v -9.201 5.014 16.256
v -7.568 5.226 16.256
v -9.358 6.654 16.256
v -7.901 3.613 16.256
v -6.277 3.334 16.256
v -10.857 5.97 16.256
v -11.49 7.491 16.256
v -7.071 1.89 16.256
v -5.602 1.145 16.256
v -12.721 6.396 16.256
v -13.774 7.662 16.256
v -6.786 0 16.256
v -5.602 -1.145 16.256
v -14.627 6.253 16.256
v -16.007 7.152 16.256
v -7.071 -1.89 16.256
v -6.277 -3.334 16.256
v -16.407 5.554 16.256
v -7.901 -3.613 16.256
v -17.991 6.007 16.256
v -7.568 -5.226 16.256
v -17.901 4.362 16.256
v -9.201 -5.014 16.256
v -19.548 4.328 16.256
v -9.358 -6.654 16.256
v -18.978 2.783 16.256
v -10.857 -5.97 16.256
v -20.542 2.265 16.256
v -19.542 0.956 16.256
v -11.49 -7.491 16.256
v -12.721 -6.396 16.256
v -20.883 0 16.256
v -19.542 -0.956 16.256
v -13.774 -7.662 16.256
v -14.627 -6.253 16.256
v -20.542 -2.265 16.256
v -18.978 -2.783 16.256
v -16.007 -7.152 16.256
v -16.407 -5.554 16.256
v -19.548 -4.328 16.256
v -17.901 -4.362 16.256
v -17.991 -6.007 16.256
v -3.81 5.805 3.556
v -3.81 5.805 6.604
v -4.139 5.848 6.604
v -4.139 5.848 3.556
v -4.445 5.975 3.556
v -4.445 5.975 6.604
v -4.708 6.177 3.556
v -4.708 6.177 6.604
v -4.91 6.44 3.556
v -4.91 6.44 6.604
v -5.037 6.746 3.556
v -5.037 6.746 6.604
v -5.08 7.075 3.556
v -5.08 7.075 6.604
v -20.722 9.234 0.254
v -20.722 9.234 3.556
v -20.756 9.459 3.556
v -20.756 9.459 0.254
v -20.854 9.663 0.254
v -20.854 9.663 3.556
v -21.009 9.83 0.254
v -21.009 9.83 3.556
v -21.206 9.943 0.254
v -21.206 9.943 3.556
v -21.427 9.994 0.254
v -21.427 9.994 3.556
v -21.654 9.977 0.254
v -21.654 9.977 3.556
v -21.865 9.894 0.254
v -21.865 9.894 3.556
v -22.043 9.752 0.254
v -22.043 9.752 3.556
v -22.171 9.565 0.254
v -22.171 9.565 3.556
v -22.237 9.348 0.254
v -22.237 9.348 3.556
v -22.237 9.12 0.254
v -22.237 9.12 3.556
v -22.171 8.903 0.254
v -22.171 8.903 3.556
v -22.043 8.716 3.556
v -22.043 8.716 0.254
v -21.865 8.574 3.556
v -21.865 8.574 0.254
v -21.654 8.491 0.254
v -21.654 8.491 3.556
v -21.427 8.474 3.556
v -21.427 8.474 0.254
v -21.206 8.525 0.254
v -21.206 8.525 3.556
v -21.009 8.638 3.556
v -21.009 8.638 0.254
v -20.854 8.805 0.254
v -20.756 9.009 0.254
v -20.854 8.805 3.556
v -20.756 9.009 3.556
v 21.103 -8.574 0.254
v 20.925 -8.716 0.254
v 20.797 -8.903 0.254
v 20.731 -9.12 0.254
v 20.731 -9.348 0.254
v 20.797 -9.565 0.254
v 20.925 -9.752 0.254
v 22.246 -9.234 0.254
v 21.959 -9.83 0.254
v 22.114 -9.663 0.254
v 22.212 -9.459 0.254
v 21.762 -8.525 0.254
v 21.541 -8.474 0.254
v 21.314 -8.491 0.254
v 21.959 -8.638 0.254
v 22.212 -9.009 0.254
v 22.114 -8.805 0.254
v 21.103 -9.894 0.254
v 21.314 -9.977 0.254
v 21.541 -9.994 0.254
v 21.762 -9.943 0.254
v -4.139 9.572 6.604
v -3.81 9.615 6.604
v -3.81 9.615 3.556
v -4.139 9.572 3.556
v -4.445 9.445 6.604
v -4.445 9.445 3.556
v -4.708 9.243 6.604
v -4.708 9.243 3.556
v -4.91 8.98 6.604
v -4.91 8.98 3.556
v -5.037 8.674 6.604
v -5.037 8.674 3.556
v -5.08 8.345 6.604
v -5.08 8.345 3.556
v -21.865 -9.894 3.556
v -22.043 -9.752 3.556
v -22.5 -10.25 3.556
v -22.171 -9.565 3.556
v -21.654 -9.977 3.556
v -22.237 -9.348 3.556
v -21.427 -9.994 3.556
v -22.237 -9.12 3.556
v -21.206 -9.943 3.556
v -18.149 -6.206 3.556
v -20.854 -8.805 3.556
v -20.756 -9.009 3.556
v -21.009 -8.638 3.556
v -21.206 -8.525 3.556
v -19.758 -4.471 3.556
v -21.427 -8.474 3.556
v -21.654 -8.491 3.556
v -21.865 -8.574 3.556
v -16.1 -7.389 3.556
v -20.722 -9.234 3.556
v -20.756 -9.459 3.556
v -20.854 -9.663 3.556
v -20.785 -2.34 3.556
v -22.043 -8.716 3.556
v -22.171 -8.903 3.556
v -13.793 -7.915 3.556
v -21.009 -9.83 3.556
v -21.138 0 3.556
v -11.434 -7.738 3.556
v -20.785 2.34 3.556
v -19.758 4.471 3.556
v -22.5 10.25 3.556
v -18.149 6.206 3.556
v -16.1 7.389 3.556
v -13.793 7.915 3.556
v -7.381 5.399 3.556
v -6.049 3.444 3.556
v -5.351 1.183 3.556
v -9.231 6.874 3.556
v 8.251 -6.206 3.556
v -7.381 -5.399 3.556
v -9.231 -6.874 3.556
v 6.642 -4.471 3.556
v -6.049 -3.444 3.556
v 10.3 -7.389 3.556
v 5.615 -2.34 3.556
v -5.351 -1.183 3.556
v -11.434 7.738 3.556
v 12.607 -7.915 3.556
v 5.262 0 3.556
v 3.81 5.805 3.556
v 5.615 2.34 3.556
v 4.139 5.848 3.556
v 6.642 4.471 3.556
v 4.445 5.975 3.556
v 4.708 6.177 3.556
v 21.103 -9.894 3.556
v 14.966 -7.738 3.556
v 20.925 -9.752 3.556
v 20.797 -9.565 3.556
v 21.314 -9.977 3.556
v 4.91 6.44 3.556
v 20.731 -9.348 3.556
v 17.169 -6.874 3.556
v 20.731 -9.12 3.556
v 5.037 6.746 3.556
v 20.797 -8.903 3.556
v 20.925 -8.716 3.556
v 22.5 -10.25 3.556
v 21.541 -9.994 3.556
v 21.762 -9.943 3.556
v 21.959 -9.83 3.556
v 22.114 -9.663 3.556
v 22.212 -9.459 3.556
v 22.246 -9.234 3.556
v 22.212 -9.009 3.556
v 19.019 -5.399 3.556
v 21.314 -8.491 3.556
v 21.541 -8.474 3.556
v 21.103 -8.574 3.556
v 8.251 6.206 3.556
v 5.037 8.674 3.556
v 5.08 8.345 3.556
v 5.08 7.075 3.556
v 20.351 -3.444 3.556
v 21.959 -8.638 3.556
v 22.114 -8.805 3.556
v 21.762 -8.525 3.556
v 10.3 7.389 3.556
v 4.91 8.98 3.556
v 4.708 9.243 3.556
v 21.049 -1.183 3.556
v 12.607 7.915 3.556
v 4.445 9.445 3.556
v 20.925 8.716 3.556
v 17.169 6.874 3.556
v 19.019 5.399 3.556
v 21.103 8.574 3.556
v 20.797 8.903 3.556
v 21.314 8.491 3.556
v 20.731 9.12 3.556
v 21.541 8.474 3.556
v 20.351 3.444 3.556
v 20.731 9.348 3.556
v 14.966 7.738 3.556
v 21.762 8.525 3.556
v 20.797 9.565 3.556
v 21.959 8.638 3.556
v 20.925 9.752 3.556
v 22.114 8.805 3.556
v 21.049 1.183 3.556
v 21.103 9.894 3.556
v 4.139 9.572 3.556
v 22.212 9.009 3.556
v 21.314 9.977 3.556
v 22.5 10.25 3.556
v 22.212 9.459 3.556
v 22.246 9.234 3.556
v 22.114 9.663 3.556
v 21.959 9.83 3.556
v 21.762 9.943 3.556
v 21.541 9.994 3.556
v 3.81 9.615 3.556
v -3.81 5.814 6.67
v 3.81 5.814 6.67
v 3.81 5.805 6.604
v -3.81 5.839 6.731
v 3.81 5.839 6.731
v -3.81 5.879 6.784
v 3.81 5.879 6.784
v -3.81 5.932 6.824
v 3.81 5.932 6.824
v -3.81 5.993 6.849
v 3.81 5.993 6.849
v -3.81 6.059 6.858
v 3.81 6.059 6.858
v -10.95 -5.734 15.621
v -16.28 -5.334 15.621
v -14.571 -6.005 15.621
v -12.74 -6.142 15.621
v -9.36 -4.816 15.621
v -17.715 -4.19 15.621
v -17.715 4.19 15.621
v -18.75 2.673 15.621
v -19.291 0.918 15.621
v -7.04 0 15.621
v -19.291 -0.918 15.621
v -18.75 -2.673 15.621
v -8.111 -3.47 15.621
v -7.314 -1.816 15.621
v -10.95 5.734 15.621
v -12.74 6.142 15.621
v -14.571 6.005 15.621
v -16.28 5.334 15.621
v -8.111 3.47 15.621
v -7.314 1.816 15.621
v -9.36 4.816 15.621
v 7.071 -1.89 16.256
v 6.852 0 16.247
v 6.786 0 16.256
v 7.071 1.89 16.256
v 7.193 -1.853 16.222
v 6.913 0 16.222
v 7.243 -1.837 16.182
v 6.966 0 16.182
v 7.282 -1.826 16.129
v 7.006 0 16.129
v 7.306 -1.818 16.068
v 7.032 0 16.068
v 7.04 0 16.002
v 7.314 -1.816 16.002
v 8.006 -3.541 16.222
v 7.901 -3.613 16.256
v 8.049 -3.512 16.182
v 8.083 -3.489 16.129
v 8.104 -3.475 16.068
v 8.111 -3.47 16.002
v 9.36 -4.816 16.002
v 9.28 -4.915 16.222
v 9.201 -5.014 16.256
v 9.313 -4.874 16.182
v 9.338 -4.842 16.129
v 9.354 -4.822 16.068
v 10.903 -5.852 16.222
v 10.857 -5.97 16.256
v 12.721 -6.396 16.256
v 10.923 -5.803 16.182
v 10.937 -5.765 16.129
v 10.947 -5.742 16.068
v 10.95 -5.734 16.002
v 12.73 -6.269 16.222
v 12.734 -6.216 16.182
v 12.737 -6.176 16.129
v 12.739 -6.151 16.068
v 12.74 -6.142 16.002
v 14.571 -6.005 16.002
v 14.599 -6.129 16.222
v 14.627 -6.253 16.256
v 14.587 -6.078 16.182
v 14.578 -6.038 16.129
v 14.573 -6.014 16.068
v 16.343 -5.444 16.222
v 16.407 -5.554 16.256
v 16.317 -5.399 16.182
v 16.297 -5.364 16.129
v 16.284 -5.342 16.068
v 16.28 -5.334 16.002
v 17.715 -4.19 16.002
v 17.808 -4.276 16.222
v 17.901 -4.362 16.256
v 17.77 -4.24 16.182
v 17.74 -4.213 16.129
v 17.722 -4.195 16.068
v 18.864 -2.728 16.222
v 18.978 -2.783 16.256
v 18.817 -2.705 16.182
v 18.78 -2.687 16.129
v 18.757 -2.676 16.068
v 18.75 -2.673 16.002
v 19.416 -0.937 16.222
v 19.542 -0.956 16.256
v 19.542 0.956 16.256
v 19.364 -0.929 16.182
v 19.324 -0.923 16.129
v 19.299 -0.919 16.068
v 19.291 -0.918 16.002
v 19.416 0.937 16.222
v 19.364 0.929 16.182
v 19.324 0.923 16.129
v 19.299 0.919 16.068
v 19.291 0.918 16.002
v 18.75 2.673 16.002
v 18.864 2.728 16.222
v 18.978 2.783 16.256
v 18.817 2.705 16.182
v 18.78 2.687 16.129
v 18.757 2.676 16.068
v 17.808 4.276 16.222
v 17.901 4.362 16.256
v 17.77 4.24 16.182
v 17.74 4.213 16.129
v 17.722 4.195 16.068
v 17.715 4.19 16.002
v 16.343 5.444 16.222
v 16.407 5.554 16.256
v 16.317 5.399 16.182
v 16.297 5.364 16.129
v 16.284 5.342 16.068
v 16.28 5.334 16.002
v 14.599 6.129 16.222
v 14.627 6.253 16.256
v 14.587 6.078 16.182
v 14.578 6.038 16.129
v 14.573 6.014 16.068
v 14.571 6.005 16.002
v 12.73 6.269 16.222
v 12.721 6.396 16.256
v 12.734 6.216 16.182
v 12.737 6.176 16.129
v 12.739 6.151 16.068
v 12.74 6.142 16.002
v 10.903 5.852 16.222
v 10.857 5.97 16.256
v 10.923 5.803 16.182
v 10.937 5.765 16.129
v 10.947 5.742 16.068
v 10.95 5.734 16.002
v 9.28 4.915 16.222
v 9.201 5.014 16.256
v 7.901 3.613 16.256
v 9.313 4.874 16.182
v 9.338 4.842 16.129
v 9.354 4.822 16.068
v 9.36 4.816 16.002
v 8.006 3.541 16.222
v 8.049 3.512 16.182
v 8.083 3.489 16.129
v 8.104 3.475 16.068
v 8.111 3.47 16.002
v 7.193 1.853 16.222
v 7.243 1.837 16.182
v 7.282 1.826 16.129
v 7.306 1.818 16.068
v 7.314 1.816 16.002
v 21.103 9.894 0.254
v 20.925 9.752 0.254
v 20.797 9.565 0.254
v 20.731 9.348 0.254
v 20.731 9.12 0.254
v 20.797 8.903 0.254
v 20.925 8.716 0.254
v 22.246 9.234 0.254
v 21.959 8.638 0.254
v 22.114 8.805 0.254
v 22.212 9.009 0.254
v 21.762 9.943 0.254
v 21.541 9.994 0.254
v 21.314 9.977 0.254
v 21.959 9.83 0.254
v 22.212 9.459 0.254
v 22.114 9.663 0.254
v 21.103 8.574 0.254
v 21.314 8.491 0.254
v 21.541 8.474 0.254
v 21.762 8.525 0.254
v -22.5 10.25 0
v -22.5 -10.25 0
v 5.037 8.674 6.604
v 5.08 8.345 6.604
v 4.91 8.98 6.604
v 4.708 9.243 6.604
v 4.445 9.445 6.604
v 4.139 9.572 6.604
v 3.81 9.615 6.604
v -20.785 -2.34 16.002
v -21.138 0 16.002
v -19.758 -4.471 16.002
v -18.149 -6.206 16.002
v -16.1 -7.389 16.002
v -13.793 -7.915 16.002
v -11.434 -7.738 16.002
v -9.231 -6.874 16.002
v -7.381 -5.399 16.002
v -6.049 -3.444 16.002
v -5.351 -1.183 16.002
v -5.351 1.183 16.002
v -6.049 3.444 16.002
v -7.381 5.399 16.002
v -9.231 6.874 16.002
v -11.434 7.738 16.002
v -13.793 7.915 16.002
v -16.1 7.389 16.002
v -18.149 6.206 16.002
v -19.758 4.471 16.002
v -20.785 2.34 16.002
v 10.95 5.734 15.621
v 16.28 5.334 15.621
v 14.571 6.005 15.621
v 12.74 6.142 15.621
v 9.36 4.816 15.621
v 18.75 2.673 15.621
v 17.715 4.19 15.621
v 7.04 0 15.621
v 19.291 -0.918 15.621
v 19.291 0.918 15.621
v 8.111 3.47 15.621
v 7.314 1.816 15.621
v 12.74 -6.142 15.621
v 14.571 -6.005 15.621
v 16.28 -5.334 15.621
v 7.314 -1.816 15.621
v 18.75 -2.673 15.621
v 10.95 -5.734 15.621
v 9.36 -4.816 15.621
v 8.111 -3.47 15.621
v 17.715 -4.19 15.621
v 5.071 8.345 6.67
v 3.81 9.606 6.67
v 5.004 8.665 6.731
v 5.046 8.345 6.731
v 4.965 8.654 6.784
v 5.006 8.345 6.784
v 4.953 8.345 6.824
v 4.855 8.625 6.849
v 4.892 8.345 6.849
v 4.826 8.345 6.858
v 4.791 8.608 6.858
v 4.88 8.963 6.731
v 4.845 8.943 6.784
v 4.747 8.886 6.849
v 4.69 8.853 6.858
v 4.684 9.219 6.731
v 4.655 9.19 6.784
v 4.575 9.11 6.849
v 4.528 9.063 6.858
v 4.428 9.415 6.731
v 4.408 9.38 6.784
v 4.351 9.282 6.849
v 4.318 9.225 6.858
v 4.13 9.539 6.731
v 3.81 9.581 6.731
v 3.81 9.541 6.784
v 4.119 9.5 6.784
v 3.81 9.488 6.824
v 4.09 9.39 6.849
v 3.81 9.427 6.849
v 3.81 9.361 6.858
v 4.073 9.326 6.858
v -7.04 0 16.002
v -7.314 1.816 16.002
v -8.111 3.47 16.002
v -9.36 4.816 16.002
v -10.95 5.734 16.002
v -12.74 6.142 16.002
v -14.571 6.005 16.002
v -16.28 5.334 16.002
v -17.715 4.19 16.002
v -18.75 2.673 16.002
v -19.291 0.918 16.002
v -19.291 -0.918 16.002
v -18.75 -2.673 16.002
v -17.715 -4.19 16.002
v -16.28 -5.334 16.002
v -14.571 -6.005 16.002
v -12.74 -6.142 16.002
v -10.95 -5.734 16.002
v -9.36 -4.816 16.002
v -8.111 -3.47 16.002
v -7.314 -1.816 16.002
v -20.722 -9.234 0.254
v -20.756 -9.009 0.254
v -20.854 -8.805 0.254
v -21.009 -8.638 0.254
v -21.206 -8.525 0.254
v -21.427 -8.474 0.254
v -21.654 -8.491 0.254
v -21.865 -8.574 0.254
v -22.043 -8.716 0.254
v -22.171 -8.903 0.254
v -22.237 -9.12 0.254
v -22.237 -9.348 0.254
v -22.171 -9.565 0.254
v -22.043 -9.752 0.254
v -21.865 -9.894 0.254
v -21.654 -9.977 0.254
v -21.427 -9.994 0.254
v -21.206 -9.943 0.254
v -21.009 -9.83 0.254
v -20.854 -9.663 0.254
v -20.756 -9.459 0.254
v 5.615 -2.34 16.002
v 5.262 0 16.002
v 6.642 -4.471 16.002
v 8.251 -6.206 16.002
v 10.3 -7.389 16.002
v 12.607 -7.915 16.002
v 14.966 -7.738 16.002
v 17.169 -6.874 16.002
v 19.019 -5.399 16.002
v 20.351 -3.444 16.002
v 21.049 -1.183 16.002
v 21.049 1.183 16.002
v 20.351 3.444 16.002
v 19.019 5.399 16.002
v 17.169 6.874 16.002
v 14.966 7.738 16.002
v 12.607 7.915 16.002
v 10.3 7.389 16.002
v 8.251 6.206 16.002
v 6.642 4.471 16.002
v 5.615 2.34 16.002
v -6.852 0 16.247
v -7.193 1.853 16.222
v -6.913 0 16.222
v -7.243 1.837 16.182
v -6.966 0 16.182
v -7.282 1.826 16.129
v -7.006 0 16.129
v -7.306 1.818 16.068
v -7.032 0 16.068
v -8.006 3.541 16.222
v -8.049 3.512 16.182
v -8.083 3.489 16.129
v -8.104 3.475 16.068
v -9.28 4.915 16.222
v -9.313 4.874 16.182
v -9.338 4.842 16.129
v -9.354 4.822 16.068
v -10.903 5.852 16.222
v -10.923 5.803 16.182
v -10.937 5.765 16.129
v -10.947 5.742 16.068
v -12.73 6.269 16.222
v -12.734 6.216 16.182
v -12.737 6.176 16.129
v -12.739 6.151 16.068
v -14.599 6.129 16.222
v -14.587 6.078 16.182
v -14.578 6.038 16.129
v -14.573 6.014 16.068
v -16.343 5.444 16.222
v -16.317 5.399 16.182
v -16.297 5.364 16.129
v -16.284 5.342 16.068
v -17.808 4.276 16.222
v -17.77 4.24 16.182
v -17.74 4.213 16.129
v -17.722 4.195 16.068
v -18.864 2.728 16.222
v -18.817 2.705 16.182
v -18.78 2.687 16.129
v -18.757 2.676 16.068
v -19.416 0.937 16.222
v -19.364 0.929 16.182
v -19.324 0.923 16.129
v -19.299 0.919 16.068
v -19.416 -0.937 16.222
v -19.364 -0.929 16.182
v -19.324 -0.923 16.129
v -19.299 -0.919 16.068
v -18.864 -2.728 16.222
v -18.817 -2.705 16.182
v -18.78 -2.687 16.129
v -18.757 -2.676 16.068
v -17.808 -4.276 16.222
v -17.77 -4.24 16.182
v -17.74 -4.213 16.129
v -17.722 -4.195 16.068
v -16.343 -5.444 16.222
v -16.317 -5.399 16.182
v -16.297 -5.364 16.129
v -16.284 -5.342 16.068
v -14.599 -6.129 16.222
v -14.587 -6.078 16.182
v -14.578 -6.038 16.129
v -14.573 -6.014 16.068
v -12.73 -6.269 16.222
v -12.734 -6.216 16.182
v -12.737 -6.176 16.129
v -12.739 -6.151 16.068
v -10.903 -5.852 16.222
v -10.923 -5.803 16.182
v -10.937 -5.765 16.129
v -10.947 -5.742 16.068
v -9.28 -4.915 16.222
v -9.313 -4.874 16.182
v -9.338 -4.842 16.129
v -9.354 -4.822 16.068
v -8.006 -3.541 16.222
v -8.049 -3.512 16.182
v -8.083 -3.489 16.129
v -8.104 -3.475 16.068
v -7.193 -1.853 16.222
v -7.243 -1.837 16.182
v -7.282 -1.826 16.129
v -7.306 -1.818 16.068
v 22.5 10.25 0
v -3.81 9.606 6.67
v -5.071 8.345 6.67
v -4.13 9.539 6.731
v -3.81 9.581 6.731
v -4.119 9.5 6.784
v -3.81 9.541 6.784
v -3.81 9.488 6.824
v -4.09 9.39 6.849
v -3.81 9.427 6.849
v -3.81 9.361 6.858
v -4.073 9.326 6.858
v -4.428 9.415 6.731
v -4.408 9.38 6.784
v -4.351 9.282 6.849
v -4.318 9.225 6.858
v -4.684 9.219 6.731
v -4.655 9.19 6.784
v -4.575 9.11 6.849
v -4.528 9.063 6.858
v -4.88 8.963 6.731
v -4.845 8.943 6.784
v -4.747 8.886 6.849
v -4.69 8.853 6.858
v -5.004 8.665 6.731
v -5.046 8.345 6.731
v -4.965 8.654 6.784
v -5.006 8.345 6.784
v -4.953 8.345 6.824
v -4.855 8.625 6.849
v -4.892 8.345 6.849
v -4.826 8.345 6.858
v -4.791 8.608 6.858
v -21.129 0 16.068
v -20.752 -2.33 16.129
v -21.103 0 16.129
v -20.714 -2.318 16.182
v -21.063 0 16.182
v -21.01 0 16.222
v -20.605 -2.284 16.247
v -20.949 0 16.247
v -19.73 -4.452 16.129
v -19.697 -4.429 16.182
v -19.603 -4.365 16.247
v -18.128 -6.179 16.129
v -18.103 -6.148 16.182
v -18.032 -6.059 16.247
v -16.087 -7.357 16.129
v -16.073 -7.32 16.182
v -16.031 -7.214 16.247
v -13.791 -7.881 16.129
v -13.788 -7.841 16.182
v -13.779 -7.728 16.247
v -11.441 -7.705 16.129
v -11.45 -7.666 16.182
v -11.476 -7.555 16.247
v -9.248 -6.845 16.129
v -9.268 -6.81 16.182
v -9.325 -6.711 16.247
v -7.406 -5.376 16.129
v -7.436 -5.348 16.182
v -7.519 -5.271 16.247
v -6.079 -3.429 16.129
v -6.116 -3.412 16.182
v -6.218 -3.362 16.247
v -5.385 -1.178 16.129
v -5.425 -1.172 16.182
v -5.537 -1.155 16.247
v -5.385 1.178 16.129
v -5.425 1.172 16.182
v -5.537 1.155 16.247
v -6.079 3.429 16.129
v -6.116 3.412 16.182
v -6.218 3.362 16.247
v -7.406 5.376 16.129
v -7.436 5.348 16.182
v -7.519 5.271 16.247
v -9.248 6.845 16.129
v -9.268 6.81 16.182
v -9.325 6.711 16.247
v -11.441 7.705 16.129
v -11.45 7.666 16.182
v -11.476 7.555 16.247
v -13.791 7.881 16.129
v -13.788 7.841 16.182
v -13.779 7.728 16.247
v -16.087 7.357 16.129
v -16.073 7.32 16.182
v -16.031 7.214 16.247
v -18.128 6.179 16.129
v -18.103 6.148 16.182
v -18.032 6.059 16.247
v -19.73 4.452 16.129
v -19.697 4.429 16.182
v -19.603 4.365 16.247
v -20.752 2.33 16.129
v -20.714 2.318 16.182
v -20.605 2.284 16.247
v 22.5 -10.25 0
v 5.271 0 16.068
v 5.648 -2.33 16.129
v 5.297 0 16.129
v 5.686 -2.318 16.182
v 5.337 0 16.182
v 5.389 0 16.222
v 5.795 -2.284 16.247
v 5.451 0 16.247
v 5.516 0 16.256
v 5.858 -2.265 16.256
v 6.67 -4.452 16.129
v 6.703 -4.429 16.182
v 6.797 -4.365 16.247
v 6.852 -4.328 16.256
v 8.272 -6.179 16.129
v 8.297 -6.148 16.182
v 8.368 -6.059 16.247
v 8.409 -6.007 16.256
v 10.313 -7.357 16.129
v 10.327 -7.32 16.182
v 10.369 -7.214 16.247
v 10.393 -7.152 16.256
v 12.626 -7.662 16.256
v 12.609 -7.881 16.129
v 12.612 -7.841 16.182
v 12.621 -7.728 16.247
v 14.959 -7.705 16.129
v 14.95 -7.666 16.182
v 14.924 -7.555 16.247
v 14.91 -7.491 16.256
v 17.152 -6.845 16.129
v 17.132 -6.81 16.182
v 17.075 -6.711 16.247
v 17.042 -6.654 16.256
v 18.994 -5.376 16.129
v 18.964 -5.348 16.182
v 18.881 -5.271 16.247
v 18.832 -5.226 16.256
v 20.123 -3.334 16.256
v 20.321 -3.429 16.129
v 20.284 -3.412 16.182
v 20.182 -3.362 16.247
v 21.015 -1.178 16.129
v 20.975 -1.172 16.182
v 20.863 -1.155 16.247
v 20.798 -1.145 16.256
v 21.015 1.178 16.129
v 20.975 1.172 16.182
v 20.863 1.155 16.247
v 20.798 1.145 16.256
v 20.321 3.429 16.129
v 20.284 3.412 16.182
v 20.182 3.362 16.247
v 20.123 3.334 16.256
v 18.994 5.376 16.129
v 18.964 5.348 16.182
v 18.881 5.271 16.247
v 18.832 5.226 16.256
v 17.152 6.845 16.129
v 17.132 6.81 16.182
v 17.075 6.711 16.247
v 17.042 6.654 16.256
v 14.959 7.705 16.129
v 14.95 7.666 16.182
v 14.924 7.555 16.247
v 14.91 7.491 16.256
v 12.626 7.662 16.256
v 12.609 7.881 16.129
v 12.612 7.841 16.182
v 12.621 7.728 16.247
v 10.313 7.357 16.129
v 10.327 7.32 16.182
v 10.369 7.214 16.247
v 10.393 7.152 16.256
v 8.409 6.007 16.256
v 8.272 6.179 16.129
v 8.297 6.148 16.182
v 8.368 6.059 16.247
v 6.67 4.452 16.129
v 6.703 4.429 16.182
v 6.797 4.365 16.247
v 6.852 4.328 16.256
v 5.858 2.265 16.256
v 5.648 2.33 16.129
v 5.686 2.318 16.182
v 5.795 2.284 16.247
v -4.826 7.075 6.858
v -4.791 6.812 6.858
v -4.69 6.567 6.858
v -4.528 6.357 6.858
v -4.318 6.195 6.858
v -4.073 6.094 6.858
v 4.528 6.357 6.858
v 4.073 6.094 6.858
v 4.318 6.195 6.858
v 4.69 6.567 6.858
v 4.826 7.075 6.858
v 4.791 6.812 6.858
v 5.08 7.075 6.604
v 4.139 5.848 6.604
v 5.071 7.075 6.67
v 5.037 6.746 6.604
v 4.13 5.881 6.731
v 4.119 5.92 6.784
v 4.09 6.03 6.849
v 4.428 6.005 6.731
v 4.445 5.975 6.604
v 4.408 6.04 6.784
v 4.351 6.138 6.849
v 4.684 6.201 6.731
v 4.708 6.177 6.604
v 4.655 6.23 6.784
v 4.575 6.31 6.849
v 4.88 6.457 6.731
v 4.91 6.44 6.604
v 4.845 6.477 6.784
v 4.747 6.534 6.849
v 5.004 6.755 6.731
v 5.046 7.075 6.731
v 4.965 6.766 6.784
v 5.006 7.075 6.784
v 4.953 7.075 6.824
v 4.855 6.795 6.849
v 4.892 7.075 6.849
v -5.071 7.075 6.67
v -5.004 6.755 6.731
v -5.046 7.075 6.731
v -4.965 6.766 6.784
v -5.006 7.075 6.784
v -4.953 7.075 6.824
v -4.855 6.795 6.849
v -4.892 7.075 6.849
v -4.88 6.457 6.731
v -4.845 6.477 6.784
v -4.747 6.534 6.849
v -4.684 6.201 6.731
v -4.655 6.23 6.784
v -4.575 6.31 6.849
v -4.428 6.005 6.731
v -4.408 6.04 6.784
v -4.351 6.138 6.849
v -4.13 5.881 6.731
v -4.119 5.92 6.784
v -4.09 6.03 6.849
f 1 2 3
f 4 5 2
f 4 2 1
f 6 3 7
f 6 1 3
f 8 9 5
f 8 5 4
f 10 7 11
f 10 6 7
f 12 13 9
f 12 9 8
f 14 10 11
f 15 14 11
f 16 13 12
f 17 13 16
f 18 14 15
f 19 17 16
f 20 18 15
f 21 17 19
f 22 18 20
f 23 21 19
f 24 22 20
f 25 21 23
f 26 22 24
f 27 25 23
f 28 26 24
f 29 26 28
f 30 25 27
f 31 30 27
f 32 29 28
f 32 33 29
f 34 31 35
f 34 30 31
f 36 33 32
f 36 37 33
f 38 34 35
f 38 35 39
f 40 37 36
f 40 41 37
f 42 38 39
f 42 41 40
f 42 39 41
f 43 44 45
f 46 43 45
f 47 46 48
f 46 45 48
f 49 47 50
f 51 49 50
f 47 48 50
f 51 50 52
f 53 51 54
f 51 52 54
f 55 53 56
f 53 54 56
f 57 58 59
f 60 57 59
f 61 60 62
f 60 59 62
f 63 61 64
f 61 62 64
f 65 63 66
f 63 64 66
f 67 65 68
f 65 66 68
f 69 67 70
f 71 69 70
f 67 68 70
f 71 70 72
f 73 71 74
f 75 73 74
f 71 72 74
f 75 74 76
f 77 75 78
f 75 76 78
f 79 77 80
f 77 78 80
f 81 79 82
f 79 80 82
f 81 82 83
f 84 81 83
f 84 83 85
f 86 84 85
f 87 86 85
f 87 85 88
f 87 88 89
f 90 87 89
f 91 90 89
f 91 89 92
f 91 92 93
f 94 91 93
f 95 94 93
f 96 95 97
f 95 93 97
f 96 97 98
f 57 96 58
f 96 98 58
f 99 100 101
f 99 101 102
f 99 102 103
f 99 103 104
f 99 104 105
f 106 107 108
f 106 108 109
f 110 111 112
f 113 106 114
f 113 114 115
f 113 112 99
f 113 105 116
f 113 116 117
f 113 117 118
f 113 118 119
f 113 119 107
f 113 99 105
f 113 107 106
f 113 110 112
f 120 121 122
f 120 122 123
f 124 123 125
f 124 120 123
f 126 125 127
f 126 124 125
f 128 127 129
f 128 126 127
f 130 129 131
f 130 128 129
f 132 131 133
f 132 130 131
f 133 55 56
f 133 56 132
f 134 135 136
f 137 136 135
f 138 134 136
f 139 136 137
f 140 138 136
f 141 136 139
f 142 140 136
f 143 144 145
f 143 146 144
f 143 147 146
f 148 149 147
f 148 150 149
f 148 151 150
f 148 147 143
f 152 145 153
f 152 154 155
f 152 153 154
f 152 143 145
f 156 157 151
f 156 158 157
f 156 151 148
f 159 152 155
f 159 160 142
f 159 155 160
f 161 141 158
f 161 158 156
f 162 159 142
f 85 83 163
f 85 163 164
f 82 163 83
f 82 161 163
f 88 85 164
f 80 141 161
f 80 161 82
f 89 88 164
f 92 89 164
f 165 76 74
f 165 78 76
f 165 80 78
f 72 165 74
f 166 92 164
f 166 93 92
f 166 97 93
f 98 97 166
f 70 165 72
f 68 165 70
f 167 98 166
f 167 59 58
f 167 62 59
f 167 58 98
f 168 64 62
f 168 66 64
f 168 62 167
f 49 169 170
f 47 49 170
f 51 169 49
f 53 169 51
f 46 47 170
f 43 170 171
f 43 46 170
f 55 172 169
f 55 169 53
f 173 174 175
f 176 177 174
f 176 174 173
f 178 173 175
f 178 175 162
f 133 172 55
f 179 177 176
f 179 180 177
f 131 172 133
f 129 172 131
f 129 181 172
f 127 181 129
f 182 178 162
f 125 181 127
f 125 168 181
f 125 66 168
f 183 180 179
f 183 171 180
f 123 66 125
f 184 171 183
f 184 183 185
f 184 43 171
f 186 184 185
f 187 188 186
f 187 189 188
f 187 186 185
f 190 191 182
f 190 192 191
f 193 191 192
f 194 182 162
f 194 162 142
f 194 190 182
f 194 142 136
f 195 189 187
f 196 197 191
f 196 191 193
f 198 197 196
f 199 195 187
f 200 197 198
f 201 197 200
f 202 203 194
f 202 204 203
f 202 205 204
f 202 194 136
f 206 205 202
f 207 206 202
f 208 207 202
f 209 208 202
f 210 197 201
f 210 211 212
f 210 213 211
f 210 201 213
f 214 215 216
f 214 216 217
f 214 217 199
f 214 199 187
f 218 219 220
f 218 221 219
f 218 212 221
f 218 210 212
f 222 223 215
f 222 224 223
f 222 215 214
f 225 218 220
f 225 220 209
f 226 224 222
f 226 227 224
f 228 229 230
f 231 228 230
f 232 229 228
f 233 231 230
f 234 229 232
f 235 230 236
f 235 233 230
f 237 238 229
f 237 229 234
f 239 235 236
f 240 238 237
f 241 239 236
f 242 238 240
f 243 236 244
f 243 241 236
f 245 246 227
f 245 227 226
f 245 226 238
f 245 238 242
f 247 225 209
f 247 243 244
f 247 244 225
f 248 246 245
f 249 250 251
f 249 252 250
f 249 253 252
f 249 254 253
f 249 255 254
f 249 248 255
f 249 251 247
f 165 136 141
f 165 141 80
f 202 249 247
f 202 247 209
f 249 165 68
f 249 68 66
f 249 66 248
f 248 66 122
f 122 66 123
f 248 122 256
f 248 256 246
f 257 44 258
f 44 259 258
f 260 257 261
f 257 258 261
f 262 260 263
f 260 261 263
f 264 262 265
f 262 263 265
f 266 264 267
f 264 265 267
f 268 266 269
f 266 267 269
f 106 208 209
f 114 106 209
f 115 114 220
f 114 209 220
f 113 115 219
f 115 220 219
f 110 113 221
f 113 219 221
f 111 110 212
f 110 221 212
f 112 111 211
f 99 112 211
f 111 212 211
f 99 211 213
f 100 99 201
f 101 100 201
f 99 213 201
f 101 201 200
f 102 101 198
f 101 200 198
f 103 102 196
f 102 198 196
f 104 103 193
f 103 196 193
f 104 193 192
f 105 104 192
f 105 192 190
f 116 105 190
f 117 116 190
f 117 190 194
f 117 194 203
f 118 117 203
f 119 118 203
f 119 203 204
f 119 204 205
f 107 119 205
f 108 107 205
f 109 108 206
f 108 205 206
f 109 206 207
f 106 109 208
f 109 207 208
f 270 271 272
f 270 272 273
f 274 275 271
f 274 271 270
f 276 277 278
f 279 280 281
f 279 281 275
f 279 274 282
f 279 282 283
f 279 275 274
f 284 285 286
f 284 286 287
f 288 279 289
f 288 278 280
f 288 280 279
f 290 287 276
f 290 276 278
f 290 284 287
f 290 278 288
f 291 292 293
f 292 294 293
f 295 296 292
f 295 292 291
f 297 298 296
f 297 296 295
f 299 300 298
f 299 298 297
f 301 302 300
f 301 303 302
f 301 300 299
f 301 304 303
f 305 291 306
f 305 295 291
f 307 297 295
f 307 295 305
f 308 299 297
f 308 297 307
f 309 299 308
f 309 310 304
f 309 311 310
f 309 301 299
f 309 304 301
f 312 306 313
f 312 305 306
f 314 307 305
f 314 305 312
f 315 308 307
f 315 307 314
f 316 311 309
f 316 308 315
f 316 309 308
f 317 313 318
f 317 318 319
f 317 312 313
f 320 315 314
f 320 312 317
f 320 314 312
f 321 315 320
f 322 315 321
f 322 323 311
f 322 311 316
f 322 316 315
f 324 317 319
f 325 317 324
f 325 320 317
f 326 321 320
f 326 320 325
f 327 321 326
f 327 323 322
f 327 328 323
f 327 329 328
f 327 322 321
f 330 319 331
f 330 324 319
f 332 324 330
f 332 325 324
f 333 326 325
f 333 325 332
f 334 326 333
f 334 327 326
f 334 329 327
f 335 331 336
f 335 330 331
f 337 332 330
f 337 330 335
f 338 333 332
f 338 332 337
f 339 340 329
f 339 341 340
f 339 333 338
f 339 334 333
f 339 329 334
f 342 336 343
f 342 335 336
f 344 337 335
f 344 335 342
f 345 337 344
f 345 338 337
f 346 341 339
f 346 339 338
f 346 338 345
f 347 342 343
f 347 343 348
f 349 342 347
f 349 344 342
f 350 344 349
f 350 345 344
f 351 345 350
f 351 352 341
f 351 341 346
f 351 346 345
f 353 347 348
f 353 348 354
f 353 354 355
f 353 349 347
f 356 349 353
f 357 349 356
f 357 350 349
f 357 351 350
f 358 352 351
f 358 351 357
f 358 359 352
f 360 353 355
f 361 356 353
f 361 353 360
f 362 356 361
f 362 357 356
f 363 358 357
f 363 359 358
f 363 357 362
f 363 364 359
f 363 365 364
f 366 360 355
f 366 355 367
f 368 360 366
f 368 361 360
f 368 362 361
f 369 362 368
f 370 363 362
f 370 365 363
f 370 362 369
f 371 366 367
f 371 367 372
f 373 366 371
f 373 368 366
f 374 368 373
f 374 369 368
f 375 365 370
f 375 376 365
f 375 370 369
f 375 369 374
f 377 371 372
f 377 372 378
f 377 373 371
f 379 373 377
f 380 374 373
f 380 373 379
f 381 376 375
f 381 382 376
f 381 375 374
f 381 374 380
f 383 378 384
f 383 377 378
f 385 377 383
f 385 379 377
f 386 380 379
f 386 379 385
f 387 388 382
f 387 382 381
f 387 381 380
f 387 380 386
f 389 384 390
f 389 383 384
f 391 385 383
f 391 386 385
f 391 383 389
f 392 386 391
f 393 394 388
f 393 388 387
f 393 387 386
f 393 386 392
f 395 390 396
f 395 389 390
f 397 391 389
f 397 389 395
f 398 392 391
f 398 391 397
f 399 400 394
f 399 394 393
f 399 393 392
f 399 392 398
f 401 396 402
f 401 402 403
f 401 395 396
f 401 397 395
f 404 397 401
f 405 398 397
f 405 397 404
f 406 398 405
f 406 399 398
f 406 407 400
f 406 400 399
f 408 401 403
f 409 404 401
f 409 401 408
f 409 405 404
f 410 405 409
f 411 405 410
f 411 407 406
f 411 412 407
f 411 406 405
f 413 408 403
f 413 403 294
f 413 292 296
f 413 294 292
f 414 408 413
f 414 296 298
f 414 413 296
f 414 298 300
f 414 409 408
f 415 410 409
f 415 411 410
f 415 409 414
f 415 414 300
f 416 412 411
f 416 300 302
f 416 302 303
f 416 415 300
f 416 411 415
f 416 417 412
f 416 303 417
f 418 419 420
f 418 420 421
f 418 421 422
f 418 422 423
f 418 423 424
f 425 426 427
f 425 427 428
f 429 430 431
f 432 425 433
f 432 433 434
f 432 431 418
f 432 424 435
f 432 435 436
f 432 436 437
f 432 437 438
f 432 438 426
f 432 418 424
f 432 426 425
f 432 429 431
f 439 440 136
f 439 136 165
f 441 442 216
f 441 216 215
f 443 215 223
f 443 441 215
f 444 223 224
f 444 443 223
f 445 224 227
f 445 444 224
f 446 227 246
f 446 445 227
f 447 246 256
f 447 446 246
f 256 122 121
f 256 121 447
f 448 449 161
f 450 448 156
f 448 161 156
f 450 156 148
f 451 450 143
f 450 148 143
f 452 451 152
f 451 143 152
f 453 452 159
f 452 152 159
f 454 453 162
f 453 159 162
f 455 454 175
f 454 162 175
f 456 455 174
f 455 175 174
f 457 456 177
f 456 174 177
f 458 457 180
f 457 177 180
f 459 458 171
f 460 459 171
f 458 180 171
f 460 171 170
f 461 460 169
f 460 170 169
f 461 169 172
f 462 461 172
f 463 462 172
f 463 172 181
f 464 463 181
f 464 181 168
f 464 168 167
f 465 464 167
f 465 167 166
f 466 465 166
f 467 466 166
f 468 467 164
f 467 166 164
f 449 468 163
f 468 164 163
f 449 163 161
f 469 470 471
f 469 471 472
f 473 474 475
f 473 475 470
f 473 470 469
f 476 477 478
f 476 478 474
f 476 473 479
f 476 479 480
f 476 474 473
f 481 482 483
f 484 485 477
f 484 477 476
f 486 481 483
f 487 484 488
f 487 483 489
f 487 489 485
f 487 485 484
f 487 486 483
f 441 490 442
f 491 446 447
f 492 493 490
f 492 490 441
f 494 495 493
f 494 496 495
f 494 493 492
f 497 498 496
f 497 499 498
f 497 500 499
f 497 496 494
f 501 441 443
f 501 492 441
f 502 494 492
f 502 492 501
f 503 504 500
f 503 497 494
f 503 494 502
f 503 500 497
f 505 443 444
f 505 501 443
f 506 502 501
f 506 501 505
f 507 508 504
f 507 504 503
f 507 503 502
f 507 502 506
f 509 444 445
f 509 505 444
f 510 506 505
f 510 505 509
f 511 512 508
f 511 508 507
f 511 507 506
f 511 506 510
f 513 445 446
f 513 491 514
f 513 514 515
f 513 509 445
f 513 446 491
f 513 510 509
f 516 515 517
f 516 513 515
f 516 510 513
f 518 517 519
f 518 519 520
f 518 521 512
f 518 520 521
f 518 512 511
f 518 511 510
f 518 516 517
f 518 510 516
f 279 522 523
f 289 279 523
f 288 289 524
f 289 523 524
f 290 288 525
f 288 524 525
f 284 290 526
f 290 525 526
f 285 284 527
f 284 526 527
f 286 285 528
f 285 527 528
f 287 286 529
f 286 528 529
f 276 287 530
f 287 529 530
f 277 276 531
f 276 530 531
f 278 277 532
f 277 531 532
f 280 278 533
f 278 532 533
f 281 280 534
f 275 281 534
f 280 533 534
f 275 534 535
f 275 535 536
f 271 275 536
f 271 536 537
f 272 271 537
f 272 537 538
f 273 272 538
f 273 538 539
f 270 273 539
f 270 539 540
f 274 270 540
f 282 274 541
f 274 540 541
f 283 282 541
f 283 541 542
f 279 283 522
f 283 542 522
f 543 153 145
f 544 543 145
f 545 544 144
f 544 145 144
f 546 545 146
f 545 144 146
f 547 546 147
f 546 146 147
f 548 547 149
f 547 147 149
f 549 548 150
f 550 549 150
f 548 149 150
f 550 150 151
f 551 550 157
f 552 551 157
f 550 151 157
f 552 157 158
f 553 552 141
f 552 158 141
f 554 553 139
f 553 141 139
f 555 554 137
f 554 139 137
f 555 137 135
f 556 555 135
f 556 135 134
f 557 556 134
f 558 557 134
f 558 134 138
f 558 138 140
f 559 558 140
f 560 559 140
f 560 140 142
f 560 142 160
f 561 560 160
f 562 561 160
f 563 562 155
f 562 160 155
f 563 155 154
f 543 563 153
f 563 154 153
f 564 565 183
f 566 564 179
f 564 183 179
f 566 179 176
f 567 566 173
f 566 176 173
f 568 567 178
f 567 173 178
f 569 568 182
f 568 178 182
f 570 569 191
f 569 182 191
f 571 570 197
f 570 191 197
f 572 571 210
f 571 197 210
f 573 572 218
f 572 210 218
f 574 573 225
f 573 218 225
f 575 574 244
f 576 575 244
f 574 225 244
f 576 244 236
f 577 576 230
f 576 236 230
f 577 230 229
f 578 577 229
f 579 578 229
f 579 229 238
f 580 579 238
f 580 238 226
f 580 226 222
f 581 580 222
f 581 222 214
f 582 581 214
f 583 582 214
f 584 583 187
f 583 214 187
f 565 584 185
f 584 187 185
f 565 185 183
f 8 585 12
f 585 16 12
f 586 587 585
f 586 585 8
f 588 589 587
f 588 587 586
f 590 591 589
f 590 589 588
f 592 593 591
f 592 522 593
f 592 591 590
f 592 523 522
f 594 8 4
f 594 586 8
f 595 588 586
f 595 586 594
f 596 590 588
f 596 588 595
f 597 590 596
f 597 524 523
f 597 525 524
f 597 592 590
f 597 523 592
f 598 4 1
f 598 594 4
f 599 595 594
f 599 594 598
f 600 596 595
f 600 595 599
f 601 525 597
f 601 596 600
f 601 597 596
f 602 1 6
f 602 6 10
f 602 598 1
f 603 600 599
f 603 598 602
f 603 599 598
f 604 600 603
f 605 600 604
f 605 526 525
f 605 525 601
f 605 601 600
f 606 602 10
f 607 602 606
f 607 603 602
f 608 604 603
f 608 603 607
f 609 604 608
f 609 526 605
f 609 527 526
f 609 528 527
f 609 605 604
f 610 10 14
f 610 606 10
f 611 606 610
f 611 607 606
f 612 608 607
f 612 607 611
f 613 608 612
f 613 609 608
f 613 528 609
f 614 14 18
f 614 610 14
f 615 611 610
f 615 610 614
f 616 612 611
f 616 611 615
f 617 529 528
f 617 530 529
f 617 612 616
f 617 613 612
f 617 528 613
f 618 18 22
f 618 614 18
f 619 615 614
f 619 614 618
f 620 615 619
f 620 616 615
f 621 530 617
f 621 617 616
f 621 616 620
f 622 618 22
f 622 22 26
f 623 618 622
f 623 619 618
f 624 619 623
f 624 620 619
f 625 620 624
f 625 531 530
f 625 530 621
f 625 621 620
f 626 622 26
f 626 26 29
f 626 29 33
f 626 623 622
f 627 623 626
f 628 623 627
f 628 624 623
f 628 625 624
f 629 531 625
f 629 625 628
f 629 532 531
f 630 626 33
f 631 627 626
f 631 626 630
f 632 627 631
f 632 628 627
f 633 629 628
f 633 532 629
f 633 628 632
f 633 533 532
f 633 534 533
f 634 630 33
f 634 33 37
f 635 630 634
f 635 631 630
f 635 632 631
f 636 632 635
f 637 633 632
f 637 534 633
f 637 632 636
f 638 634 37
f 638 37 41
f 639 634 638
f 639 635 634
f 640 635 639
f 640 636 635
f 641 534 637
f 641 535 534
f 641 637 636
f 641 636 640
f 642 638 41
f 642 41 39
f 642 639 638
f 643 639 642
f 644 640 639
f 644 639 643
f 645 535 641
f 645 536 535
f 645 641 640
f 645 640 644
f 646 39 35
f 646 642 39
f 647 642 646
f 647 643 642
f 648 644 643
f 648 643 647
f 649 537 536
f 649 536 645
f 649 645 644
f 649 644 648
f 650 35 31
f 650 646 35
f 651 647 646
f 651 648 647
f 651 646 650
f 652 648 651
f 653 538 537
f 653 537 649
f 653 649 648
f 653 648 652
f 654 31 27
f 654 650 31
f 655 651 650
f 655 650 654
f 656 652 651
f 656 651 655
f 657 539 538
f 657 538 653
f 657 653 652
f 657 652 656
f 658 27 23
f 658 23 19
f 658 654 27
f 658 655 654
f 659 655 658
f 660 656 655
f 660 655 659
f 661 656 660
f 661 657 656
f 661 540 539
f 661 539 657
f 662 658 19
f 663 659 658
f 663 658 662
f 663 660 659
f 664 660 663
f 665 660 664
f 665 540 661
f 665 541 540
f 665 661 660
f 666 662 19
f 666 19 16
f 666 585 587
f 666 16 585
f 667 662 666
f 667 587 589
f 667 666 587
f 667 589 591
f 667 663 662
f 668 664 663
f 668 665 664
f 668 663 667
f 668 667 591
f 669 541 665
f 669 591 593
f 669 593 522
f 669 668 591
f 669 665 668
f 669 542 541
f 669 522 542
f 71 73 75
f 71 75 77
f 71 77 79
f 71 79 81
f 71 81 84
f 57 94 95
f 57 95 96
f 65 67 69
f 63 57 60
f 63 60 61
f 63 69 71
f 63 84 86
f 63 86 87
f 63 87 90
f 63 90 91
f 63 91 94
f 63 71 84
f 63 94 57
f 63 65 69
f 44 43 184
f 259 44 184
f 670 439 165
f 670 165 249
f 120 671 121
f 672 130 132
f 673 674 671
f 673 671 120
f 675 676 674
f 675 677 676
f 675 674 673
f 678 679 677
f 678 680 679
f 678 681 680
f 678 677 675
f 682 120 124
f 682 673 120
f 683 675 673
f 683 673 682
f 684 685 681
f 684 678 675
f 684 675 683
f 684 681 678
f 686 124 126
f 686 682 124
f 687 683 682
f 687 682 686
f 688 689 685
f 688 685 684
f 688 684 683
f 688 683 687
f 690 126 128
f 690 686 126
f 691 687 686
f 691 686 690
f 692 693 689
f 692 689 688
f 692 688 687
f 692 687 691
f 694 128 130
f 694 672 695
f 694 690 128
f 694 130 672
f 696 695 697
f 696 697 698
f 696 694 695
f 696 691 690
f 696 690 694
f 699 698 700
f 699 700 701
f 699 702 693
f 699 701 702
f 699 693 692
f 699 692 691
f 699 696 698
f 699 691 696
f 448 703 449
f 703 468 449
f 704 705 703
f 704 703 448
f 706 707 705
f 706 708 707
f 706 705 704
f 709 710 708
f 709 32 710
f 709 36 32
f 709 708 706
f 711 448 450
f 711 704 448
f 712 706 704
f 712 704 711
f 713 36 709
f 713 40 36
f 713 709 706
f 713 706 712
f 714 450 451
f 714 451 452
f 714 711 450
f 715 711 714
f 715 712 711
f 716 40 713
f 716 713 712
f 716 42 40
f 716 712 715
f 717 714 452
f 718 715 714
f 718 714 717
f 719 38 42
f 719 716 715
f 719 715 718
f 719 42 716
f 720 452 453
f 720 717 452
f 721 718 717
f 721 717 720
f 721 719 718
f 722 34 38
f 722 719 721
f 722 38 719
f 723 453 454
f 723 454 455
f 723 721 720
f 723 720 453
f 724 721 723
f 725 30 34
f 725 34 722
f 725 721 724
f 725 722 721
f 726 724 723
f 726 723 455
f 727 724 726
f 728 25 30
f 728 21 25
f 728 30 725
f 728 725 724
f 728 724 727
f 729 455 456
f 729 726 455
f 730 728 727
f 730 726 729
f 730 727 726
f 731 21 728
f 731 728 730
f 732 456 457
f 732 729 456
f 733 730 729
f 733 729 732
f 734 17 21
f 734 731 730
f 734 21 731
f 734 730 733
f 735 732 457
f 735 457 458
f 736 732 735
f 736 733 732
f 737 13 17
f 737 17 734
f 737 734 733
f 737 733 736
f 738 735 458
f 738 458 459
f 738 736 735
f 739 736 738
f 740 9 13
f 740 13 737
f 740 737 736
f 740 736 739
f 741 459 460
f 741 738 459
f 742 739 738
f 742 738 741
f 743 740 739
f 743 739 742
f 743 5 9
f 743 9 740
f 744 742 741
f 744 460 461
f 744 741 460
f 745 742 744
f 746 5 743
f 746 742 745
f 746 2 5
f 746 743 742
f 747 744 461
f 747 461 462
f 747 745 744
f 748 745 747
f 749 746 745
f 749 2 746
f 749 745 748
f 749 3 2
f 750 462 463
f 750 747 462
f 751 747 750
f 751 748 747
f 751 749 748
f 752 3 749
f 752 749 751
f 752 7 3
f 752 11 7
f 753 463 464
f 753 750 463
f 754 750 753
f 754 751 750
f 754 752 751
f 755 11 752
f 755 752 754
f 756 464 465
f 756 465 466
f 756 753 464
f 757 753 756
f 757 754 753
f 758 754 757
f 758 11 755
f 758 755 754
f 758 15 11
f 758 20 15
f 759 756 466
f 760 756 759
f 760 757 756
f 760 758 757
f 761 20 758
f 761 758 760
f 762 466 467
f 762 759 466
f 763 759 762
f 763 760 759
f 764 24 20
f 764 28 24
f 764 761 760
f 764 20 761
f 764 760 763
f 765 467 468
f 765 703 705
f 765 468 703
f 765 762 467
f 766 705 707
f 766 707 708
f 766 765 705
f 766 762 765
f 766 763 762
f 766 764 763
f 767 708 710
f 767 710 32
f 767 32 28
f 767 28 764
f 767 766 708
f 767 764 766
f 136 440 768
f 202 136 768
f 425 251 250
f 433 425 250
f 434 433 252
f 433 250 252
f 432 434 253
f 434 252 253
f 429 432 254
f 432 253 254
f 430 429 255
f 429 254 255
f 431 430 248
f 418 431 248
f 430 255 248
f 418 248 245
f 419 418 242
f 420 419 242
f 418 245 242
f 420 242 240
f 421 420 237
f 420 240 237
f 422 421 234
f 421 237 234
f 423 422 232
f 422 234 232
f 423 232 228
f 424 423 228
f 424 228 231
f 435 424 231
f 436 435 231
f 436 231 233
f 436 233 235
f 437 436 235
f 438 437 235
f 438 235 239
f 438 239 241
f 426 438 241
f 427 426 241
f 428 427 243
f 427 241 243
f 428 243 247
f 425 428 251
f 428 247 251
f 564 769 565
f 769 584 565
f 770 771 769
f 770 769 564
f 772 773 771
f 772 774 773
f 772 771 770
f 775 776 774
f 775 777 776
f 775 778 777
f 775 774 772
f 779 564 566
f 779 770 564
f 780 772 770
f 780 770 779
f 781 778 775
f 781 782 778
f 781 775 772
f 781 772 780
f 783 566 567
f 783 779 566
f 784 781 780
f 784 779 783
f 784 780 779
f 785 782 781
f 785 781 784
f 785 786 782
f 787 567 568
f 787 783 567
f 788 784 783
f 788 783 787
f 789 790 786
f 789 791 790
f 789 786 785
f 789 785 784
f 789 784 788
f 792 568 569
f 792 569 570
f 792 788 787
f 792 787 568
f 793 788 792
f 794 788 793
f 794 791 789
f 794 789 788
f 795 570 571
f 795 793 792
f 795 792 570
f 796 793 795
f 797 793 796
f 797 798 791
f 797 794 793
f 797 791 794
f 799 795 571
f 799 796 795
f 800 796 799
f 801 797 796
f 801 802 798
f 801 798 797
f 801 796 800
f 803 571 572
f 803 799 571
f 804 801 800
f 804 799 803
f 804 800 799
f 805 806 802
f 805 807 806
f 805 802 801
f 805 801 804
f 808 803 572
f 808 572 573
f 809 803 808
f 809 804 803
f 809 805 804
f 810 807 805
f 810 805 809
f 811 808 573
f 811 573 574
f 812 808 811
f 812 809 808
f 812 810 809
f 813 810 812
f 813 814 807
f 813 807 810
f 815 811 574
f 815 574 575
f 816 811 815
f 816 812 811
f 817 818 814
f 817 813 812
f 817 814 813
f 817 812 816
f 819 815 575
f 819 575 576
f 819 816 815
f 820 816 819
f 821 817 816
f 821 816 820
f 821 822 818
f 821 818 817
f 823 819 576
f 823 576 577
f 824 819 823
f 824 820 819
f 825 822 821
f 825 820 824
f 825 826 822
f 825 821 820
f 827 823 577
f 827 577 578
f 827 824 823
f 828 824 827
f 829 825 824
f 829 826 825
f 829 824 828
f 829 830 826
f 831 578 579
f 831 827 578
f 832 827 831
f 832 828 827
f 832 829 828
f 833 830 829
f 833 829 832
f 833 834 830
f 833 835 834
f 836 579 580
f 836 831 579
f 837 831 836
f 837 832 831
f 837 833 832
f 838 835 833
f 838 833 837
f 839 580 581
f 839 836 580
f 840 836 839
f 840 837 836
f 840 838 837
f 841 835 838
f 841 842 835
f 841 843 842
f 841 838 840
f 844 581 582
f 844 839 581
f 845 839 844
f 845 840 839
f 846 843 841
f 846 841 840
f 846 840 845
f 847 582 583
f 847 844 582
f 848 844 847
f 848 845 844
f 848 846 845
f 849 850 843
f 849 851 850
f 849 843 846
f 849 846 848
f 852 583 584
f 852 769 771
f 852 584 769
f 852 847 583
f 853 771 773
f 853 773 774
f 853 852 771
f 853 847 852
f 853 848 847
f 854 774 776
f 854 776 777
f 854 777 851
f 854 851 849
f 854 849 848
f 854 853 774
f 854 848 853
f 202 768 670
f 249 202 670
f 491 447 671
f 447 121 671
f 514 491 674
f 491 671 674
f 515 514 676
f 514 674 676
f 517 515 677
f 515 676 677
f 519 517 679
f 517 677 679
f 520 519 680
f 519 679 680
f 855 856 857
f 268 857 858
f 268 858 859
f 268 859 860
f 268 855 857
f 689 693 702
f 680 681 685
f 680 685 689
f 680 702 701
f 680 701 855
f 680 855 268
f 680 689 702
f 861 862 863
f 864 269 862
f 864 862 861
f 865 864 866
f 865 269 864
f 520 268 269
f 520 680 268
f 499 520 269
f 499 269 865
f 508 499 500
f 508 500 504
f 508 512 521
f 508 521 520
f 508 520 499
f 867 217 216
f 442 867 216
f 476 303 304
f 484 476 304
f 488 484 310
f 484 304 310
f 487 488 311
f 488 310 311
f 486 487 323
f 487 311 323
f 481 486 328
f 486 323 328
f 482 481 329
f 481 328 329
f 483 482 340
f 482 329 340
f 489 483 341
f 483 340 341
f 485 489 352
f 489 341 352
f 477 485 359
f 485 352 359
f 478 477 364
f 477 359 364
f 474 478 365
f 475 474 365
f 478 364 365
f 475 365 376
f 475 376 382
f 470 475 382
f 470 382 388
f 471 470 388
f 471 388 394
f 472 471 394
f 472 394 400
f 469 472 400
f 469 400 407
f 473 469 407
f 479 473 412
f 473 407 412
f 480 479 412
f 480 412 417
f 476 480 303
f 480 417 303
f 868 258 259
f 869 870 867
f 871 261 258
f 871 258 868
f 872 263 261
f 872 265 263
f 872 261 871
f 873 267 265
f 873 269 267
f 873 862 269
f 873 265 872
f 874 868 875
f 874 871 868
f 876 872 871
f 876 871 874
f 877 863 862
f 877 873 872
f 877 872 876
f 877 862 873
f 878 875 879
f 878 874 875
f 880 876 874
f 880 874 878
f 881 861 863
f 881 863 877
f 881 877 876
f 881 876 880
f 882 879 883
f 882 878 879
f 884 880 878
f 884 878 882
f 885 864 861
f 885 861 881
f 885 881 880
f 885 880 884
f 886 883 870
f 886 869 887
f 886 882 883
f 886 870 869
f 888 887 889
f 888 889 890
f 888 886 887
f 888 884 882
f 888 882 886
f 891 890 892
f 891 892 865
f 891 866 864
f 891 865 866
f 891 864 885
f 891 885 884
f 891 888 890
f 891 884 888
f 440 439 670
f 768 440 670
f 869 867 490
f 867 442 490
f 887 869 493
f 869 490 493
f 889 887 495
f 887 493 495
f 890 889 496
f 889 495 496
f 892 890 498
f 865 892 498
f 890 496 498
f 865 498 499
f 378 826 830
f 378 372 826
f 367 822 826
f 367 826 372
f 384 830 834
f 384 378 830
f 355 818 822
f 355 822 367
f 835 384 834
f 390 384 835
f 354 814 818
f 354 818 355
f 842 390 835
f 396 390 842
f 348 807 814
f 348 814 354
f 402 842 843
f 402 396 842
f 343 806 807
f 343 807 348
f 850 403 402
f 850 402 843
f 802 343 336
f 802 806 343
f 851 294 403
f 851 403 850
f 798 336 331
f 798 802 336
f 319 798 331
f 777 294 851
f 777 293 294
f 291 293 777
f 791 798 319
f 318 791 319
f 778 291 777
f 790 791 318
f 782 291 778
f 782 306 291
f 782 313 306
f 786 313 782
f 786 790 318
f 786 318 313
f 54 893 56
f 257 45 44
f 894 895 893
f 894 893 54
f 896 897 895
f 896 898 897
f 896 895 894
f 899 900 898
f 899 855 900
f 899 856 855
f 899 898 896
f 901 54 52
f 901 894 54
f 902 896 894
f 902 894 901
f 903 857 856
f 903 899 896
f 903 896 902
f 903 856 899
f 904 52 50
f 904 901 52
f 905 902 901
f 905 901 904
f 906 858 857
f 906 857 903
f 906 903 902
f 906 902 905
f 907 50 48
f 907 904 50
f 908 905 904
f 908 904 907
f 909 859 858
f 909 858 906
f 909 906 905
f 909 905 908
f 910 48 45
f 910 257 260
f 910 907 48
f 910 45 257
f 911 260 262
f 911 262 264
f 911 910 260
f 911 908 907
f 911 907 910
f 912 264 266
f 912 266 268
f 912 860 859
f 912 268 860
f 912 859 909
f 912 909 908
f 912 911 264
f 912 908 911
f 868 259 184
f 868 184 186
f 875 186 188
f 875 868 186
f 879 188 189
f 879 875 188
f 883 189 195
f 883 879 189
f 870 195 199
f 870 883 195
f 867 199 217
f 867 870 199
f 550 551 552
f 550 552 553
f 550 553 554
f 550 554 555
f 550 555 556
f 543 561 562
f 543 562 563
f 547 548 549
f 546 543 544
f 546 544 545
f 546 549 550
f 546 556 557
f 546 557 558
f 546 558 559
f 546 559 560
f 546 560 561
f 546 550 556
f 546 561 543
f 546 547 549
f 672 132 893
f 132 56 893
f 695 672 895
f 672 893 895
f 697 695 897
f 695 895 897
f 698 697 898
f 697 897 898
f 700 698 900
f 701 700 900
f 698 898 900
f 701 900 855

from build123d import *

# Parameters (mm, degrees)
SKETCH1_W           = 45
SKETCH1_H           = 20.5
BOSS_EXTRUDE2_DEPTH = 3.556
SKETCH2_R           = 7.9375
BOSS_EXTRUDE3_DEPTH = 12.7
SKETCH3_R           = 6.1595
CUT_EXTRUDE1_DEPTH  = 0.635
SKETCH4_W           = 10.16
SKETCH4_H           = 3.81
BOSS_EXTRUDE4_DEPTH = 3.302
FILLET1_R           = 1.27
FILLET2_R           = 0.254
SKETCH5_R           = 0.762
CUT_EXTRUDE2_DEPTH  = 3.302


with BuildPart() as part:
    # Sketch1 → Boss-Extrude2 (new body)
    with BuildSketch(Plane.XY):
        Rectangle(SKETCH1_W, SKETCH1_H)
    extrude(amount=BOSS_EXTRUDE2_DEPTH)

    # Sketch2 → Boss-Extrude3 (add)
    with BuildSketch(Plane.XY.offset(3.556)):
        with Locations((13.2, 0)):
            Circle(SKETCH2_R)
        with Locations((-13.2, 0)):
            Circle(SKETCH2_R)
    extrude(amount=BOSS_EXTRUDE3_DEPTH)

    # Sketch3 → Cut-Extrude1 (cut)
    with BuildSketch(Plane.XY.offset(16.256)):
        with Locations((-13.2, 0)):
            Circle(SKETCH3_R)
        with Locations((13.2, 0)):
            Circle(SKETCH3_R)
    extrude(amount=-CUT_EXTRUDE1_DEPTH, mode=Mode.SUBTRACT)

    # Sketch4 → Boss-Extrude4 (add)
    with BuildSketch(Plane.XY.offset(3.556)):
        with Locations((0, 7.71)):
            Rectangle(SKETCH4_W, SKETCH4_H)
    extrude(amount=BOSS_EXTRUDE4_DEPTH)

    # Fillet1
    fillet1_edges = [part.edges().sort_by_distance(p)[0] for p in [
        (5.08, 5.805, 5.207),
        (-5.08, 9.615, 5.207),
        (5.08, 9.615, 5.207),
        (-5.08, 5.805, 5.207),
    ]]
    fillet(fillet1_edges, radius=FILLET1_R)

    # Fillet2
    fillet2_edges = [part.edges().sort_by_distance(p)[0] for p in [
        (-4.708025612, 6.176974388, 6.858),
        (-5.08, 7.71, 6.858),
        (-4.708025612, 9.243025612, 6.858),
        (0, 9.615, 6.858),
        (4.708025612, 9.243025612, 6.858),
        (5.08, 7.71, 6.858),
        (4.708025612, 6.176974388, 6.858),
        (0, 5.805, 6.858),
        (5.2625, 0, 16.256),
        (7.0405, 0, 16.256),
        (-21.1375, 0, 16.256),
        (-19.3595, 0, 16.256),
    ]]
    fillet(fillet2_edges, radius=FILLET2_R)

    # Sketch5 → Cut-Extrude2 (cut)
    with BuildSketch(Plane.XY.offset(3.556)):
        with Locations((21.484, -9.234)):
            Circle(SKETCH5_R)
        with Locations((21.484, 9.234)):
            Circle(SKETCH5_R)
        with Locations((-21.484, 9.234)):
            Circle(SKETCH5_R)
        with Locations((-21.484, -9.234)):
            Circle(SKETCH5_R)
    extrude(amount=-CUT_EXTRUDE2_DEPTH, mode=Mode.SUBTRACT)


solid = part.part
